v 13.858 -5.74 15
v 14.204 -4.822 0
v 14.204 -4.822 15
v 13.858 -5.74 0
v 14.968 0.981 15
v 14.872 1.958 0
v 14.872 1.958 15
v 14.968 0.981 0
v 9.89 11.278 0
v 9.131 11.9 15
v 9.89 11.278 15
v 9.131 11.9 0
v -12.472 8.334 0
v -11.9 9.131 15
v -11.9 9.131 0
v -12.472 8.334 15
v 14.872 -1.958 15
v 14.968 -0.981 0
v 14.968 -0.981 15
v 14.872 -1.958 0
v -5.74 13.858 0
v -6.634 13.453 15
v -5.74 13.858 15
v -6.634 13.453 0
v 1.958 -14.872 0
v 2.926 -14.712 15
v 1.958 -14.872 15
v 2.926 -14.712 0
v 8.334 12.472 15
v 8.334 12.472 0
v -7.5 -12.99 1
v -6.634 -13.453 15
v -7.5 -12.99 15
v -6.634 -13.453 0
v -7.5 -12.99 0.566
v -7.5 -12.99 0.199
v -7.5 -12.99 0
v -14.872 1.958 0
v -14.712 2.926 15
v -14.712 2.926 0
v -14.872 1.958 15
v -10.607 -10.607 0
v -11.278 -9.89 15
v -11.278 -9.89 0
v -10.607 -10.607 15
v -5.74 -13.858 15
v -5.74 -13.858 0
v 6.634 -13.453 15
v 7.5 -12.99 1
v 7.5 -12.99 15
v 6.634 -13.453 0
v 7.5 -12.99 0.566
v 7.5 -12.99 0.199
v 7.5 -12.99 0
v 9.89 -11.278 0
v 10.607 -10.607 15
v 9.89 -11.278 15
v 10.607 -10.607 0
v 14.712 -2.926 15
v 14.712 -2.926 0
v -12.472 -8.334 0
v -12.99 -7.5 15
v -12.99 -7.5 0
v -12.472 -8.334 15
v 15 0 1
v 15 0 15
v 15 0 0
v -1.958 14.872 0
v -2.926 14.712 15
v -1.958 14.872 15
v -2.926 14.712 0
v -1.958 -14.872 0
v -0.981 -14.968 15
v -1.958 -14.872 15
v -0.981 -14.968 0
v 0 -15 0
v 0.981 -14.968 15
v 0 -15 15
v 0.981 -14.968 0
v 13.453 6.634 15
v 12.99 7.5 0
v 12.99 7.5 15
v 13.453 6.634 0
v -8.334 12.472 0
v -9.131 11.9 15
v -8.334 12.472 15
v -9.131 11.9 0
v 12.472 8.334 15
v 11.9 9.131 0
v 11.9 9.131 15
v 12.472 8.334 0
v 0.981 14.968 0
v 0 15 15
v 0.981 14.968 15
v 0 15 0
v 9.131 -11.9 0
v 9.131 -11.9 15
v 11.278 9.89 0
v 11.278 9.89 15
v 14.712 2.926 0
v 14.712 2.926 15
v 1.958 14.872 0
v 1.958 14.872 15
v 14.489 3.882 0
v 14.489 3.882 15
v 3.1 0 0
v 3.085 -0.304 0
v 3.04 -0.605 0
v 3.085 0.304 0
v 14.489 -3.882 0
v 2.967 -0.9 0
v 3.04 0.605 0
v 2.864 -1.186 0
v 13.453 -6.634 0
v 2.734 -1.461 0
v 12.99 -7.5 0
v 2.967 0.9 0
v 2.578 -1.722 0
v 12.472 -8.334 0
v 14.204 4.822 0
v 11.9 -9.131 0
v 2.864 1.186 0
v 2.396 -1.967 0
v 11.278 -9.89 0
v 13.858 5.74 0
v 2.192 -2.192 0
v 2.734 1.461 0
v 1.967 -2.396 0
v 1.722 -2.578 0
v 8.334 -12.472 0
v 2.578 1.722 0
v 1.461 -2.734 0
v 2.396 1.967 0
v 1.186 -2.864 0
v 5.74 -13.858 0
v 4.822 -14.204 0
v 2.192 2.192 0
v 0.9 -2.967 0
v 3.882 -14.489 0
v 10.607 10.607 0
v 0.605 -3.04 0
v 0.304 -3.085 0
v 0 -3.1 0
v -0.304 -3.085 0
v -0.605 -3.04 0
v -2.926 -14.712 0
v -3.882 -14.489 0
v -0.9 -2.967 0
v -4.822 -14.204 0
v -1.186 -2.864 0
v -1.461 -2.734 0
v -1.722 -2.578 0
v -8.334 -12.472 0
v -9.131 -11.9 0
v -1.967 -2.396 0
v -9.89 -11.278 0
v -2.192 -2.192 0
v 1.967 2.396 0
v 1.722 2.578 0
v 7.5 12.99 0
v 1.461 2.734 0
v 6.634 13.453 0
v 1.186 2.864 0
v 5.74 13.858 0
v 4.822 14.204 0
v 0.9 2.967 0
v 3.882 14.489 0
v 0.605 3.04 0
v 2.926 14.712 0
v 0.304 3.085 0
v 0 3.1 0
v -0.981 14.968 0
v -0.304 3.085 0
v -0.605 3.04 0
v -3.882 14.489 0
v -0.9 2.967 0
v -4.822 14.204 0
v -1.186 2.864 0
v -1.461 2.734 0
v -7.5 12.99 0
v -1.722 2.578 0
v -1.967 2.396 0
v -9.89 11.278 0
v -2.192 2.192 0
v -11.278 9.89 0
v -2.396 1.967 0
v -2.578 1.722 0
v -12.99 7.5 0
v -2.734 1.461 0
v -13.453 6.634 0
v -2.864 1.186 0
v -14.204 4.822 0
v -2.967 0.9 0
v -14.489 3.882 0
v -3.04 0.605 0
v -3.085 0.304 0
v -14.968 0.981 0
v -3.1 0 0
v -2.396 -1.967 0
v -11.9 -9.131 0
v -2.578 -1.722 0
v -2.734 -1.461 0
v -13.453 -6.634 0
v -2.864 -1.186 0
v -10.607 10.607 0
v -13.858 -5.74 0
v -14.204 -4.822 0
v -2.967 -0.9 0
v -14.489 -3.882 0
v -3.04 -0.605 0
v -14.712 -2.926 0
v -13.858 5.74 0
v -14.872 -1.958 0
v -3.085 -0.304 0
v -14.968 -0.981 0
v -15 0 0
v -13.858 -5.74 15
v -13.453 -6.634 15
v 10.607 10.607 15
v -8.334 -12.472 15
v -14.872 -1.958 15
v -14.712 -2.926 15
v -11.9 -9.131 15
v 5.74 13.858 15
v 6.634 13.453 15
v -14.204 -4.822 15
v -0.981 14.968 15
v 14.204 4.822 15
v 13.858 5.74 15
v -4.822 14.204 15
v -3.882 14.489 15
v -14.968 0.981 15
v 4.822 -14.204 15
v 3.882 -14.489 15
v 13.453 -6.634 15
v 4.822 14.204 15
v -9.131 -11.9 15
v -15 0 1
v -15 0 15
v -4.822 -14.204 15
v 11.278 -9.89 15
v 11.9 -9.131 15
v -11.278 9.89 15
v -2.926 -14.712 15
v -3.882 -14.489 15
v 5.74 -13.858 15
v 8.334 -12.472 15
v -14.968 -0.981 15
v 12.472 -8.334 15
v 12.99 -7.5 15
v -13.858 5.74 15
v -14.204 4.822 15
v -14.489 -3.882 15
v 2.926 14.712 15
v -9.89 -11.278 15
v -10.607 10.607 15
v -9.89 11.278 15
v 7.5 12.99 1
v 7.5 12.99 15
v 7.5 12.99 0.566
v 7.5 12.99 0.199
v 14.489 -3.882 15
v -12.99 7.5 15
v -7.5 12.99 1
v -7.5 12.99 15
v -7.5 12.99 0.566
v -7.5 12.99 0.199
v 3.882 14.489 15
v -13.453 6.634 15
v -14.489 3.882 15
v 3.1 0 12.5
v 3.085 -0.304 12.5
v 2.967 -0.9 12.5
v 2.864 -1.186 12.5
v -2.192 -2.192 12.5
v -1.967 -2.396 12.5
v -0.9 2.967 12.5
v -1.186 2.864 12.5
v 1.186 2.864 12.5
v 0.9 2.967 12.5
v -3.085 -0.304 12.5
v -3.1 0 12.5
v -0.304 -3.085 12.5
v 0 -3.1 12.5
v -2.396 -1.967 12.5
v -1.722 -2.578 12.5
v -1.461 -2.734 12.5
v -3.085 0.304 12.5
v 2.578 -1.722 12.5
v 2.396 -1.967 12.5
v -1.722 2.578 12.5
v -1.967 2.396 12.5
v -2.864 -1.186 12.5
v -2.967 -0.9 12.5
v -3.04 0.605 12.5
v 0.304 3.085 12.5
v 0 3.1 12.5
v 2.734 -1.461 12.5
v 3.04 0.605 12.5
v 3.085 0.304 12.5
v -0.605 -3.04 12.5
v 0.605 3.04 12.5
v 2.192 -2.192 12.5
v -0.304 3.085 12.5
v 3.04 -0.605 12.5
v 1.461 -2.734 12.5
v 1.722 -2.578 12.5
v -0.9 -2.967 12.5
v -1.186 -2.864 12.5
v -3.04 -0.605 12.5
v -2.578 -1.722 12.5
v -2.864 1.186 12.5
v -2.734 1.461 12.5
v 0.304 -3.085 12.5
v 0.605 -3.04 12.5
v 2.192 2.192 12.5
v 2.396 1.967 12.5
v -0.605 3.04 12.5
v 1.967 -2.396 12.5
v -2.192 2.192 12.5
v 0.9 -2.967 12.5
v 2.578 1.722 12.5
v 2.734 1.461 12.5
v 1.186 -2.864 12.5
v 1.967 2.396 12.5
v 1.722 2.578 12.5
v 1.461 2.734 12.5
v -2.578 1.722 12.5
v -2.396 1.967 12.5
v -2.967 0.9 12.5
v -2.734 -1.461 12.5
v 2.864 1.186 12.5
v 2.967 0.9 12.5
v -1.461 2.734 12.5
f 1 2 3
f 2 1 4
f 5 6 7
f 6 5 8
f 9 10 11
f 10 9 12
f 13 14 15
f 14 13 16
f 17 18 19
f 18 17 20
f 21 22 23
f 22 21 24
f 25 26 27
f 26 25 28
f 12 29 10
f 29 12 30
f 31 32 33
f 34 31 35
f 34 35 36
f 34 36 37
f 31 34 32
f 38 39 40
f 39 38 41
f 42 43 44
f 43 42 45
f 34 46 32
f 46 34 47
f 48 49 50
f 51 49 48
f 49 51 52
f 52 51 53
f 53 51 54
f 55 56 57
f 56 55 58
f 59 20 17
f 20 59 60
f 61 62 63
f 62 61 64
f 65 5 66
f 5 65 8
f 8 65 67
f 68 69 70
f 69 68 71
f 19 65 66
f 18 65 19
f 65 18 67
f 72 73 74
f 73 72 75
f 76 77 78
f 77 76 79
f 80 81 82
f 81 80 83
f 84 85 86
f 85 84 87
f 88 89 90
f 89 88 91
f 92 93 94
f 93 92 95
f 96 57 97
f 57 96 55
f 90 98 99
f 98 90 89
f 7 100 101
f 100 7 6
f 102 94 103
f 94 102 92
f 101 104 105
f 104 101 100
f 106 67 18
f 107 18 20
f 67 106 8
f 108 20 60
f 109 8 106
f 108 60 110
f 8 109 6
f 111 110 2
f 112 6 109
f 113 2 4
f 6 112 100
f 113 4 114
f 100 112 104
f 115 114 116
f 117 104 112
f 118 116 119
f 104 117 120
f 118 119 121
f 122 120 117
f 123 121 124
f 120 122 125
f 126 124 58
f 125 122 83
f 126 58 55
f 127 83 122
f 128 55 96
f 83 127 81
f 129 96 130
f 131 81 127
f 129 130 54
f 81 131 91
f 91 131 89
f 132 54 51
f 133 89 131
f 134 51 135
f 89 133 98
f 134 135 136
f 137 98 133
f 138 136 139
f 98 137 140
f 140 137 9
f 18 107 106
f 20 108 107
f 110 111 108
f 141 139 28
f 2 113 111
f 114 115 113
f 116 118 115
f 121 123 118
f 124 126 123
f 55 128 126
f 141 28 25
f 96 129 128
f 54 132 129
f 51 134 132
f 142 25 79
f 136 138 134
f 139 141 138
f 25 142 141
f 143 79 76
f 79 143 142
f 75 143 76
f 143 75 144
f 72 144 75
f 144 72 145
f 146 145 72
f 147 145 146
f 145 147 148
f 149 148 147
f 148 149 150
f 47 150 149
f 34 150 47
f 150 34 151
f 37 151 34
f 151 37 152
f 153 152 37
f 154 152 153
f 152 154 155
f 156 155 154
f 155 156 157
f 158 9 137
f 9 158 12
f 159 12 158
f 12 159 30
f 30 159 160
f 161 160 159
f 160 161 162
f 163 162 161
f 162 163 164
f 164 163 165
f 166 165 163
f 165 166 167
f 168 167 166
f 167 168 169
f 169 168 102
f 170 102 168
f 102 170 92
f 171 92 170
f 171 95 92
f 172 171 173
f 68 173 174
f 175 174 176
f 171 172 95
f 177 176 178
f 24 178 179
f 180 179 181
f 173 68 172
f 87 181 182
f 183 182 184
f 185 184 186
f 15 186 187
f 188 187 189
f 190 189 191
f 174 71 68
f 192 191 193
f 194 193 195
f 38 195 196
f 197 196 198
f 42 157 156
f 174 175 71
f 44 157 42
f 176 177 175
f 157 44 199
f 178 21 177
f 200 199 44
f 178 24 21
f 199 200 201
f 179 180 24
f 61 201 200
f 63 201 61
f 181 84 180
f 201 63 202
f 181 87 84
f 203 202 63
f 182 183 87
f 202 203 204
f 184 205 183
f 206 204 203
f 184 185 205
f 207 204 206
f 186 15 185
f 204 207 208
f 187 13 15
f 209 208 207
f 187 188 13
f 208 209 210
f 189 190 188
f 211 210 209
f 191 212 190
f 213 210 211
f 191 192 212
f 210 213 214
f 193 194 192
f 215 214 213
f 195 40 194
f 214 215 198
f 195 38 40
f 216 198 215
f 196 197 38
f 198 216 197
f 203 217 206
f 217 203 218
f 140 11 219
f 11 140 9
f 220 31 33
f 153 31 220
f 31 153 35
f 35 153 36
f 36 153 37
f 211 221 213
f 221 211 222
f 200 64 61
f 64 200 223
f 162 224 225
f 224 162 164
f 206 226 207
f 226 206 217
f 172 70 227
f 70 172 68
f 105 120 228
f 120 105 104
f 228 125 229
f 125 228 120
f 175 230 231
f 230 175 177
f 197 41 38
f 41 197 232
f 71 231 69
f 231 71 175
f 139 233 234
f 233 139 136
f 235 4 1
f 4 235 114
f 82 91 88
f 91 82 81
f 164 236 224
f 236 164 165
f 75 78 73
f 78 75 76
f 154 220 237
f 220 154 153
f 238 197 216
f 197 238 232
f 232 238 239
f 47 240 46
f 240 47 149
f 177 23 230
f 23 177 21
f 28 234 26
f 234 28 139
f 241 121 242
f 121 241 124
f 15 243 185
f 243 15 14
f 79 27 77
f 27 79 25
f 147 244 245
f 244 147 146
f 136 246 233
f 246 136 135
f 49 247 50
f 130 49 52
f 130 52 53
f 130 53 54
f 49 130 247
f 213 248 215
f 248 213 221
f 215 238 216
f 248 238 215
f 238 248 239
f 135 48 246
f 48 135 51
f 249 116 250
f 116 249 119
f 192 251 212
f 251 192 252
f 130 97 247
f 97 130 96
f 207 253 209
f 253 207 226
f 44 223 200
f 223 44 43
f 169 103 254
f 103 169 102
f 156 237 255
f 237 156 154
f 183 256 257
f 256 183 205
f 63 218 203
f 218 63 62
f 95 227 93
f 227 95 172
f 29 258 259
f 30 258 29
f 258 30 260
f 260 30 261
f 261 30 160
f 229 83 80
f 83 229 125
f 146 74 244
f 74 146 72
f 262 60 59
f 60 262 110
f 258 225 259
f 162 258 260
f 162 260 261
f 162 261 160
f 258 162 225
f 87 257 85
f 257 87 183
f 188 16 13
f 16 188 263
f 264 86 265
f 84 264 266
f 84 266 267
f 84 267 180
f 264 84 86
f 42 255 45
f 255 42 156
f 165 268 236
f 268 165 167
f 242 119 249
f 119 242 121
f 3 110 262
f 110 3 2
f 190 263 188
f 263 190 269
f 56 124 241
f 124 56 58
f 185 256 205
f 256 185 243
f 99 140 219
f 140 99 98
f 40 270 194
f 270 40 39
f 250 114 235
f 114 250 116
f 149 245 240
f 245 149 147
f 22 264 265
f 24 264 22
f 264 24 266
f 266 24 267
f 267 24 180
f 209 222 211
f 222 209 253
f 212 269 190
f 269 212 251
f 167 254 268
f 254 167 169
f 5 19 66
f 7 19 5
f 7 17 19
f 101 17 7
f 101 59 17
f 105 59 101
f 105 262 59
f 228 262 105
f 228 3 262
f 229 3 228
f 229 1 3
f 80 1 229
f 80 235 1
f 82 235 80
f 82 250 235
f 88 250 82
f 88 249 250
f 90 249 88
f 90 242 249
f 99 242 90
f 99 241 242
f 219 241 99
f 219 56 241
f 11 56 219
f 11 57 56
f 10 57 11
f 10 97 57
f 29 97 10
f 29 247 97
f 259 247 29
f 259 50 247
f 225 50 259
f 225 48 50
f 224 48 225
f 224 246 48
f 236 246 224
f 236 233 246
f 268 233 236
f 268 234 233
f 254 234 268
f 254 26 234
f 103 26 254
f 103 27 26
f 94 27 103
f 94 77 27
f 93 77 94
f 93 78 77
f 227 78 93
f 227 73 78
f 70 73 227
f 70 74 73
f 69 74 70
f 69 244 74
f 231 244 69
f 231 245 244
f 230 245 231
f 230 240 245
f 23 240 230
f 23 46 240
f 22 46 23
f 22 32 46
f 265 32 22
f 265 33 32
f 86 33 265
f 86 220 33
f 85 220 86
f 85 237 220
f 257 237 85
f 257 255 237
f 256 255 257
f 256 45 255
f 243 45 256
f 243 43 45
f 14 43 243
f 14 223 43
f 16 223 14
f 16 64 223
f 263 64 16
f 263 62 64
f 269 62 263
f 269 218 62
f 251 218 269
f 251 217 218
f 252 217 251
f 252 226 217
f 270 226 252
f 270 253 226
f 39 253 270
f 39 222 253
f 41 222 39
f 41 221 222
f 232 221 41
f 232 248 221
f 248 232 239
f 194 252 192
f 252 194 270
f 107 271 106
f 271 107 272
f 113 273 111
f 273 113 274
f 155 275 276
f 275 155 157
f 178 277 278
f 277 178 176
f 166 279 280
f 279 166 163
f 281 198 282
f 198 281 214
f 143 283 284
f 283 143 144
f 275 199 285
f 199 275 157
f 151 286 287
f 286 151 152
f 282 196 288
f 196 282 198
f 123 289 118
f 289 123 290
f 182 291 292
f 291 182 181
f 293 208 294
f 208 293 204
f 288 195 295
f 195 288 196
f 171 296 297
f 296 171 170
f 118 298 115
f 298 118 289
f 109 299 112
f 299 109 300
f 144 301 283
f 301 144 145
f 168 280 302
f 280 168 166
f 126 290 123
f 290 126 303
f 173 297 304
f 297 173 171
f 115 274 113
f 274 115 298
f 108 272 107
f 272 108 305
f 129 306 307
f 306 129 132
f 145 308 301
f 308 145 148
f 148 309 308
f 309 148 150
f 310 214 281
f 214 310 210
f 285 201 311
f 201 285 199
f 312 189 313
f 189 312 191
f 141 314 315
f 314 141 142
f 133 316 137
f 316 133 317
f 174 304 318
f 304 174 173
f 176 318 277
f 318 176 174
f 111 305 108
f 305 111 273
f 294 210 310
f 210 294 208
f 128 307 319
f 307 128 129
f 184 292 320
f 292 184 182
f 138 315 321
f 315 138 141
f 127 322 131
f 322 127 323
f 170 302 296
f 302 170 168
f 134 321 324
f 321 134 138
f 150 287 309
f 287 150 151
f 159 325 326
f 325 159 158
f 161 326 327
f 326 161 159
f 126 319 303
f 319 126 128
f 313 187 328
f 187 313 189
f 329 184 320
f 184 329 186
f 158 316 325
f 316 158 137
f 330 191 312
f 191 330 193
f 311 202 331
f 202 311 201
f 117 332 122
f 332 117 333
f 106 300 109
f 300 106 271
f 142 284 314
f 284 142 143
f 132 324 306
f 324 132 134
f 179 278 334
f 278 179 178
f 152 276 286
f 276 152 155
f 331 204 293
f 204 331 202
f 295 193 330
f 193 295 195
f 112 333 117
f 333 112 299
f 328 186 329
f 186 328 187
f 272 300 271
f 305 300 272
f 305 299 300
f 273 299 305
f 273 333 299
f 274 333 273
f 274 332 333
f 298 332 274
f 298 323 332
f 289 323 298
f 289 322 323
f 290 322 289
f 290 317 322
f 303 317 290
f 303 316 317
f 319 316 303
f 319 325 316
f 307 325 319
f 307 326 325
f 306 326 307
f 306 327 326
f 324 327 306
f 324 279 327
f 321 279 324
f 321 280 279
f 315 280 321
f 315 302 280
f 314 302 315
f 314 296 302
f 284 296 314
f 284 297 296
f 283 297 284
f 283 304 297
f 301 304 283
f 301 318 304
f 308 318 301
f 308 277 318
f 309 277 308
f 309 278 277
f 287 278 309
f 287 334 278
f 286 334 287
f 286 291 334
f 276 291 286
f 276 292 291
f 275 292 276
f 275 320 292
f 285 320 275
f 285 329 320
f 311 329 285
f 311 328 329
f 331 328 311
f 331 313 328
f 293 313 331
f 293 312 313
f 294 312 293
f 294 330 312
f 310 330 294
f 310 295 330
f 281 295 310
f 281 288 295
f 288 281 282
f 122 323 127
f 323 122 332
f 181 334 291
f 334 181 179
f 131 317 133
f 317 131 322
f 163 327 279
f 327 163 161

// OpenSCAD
// Replacement knob for hotplate stirrer (D-shaft)
// Print orientation: side facing hotplate down on bed (z = 0)

// ---------------- Parameters ----------------
knob_d        = 30;    // knob outer diameter
knob_h        = 15;    // knob height
shaft_d       = 6.2;   // D-shaft diameter
bore_depth    = 12;    // blind bore depth from bottom face
bore_flat     = 4.7;   // D-bore flat-to-flat distance
groove_count  = 18;    // number of grip grooves
groove_d      = 2;     // grip groove diameter (half-cylinder)
pointer_w     = 1.5;   // pointer groove width
pointer_d    = pointer_w; // pointer groove depth (same as width)
eps           = 0.5;   // cutter overshoot past faces

$fn = 96;

// Derived
bore_r = shaft_d / 2;
pitch  = 360 / groove_count;

// ---------------- Model ----------------
difference() {
    // Main body
    cylinder(d = knob_d, h = knob_h);

    // D-shaped blind bore, centred on origin, flat on +X side
    translate([0, 0, -eps])
        linear_extrude(height = bore_depth + 2 * eps)
            circle(r = bore_r, $fn = 64);
    translate([bore_flat / 2, 0, -eps])
        linear_extrude(height = bore_depth + 2 * eps)
            translate([bore_r / 2, 0, 0]) rotate([0, 90, 0])
                cube([bore_r / 2, bore_depth + 2 * eps, 1]);

    // Grip grooves: vertical half-cylinders centred on outer surface
    for (i = [0 : groove_count - 1]) {
        a = i * pitch;
        translate([knob_d / 2 * cos(a), knob_d / 2 * sin(a), 0])
            rotate([0, 90, a])
                cylinder(d = groove_d, h = knob_h + 2 * eps, $fn = 16);
    }

    // Pointer groove: radial slot from centre to edge, on +X side
    translate([0, 0, -eps])
        linear_extrude(height = knob_h + 2 * eps)
            translate([0, -pointer_w / 2, 0]) rotate([0, 90, 0])
                cube([pointer_d, knob_d / 2 + 1, eps + pointer_d]);
}
